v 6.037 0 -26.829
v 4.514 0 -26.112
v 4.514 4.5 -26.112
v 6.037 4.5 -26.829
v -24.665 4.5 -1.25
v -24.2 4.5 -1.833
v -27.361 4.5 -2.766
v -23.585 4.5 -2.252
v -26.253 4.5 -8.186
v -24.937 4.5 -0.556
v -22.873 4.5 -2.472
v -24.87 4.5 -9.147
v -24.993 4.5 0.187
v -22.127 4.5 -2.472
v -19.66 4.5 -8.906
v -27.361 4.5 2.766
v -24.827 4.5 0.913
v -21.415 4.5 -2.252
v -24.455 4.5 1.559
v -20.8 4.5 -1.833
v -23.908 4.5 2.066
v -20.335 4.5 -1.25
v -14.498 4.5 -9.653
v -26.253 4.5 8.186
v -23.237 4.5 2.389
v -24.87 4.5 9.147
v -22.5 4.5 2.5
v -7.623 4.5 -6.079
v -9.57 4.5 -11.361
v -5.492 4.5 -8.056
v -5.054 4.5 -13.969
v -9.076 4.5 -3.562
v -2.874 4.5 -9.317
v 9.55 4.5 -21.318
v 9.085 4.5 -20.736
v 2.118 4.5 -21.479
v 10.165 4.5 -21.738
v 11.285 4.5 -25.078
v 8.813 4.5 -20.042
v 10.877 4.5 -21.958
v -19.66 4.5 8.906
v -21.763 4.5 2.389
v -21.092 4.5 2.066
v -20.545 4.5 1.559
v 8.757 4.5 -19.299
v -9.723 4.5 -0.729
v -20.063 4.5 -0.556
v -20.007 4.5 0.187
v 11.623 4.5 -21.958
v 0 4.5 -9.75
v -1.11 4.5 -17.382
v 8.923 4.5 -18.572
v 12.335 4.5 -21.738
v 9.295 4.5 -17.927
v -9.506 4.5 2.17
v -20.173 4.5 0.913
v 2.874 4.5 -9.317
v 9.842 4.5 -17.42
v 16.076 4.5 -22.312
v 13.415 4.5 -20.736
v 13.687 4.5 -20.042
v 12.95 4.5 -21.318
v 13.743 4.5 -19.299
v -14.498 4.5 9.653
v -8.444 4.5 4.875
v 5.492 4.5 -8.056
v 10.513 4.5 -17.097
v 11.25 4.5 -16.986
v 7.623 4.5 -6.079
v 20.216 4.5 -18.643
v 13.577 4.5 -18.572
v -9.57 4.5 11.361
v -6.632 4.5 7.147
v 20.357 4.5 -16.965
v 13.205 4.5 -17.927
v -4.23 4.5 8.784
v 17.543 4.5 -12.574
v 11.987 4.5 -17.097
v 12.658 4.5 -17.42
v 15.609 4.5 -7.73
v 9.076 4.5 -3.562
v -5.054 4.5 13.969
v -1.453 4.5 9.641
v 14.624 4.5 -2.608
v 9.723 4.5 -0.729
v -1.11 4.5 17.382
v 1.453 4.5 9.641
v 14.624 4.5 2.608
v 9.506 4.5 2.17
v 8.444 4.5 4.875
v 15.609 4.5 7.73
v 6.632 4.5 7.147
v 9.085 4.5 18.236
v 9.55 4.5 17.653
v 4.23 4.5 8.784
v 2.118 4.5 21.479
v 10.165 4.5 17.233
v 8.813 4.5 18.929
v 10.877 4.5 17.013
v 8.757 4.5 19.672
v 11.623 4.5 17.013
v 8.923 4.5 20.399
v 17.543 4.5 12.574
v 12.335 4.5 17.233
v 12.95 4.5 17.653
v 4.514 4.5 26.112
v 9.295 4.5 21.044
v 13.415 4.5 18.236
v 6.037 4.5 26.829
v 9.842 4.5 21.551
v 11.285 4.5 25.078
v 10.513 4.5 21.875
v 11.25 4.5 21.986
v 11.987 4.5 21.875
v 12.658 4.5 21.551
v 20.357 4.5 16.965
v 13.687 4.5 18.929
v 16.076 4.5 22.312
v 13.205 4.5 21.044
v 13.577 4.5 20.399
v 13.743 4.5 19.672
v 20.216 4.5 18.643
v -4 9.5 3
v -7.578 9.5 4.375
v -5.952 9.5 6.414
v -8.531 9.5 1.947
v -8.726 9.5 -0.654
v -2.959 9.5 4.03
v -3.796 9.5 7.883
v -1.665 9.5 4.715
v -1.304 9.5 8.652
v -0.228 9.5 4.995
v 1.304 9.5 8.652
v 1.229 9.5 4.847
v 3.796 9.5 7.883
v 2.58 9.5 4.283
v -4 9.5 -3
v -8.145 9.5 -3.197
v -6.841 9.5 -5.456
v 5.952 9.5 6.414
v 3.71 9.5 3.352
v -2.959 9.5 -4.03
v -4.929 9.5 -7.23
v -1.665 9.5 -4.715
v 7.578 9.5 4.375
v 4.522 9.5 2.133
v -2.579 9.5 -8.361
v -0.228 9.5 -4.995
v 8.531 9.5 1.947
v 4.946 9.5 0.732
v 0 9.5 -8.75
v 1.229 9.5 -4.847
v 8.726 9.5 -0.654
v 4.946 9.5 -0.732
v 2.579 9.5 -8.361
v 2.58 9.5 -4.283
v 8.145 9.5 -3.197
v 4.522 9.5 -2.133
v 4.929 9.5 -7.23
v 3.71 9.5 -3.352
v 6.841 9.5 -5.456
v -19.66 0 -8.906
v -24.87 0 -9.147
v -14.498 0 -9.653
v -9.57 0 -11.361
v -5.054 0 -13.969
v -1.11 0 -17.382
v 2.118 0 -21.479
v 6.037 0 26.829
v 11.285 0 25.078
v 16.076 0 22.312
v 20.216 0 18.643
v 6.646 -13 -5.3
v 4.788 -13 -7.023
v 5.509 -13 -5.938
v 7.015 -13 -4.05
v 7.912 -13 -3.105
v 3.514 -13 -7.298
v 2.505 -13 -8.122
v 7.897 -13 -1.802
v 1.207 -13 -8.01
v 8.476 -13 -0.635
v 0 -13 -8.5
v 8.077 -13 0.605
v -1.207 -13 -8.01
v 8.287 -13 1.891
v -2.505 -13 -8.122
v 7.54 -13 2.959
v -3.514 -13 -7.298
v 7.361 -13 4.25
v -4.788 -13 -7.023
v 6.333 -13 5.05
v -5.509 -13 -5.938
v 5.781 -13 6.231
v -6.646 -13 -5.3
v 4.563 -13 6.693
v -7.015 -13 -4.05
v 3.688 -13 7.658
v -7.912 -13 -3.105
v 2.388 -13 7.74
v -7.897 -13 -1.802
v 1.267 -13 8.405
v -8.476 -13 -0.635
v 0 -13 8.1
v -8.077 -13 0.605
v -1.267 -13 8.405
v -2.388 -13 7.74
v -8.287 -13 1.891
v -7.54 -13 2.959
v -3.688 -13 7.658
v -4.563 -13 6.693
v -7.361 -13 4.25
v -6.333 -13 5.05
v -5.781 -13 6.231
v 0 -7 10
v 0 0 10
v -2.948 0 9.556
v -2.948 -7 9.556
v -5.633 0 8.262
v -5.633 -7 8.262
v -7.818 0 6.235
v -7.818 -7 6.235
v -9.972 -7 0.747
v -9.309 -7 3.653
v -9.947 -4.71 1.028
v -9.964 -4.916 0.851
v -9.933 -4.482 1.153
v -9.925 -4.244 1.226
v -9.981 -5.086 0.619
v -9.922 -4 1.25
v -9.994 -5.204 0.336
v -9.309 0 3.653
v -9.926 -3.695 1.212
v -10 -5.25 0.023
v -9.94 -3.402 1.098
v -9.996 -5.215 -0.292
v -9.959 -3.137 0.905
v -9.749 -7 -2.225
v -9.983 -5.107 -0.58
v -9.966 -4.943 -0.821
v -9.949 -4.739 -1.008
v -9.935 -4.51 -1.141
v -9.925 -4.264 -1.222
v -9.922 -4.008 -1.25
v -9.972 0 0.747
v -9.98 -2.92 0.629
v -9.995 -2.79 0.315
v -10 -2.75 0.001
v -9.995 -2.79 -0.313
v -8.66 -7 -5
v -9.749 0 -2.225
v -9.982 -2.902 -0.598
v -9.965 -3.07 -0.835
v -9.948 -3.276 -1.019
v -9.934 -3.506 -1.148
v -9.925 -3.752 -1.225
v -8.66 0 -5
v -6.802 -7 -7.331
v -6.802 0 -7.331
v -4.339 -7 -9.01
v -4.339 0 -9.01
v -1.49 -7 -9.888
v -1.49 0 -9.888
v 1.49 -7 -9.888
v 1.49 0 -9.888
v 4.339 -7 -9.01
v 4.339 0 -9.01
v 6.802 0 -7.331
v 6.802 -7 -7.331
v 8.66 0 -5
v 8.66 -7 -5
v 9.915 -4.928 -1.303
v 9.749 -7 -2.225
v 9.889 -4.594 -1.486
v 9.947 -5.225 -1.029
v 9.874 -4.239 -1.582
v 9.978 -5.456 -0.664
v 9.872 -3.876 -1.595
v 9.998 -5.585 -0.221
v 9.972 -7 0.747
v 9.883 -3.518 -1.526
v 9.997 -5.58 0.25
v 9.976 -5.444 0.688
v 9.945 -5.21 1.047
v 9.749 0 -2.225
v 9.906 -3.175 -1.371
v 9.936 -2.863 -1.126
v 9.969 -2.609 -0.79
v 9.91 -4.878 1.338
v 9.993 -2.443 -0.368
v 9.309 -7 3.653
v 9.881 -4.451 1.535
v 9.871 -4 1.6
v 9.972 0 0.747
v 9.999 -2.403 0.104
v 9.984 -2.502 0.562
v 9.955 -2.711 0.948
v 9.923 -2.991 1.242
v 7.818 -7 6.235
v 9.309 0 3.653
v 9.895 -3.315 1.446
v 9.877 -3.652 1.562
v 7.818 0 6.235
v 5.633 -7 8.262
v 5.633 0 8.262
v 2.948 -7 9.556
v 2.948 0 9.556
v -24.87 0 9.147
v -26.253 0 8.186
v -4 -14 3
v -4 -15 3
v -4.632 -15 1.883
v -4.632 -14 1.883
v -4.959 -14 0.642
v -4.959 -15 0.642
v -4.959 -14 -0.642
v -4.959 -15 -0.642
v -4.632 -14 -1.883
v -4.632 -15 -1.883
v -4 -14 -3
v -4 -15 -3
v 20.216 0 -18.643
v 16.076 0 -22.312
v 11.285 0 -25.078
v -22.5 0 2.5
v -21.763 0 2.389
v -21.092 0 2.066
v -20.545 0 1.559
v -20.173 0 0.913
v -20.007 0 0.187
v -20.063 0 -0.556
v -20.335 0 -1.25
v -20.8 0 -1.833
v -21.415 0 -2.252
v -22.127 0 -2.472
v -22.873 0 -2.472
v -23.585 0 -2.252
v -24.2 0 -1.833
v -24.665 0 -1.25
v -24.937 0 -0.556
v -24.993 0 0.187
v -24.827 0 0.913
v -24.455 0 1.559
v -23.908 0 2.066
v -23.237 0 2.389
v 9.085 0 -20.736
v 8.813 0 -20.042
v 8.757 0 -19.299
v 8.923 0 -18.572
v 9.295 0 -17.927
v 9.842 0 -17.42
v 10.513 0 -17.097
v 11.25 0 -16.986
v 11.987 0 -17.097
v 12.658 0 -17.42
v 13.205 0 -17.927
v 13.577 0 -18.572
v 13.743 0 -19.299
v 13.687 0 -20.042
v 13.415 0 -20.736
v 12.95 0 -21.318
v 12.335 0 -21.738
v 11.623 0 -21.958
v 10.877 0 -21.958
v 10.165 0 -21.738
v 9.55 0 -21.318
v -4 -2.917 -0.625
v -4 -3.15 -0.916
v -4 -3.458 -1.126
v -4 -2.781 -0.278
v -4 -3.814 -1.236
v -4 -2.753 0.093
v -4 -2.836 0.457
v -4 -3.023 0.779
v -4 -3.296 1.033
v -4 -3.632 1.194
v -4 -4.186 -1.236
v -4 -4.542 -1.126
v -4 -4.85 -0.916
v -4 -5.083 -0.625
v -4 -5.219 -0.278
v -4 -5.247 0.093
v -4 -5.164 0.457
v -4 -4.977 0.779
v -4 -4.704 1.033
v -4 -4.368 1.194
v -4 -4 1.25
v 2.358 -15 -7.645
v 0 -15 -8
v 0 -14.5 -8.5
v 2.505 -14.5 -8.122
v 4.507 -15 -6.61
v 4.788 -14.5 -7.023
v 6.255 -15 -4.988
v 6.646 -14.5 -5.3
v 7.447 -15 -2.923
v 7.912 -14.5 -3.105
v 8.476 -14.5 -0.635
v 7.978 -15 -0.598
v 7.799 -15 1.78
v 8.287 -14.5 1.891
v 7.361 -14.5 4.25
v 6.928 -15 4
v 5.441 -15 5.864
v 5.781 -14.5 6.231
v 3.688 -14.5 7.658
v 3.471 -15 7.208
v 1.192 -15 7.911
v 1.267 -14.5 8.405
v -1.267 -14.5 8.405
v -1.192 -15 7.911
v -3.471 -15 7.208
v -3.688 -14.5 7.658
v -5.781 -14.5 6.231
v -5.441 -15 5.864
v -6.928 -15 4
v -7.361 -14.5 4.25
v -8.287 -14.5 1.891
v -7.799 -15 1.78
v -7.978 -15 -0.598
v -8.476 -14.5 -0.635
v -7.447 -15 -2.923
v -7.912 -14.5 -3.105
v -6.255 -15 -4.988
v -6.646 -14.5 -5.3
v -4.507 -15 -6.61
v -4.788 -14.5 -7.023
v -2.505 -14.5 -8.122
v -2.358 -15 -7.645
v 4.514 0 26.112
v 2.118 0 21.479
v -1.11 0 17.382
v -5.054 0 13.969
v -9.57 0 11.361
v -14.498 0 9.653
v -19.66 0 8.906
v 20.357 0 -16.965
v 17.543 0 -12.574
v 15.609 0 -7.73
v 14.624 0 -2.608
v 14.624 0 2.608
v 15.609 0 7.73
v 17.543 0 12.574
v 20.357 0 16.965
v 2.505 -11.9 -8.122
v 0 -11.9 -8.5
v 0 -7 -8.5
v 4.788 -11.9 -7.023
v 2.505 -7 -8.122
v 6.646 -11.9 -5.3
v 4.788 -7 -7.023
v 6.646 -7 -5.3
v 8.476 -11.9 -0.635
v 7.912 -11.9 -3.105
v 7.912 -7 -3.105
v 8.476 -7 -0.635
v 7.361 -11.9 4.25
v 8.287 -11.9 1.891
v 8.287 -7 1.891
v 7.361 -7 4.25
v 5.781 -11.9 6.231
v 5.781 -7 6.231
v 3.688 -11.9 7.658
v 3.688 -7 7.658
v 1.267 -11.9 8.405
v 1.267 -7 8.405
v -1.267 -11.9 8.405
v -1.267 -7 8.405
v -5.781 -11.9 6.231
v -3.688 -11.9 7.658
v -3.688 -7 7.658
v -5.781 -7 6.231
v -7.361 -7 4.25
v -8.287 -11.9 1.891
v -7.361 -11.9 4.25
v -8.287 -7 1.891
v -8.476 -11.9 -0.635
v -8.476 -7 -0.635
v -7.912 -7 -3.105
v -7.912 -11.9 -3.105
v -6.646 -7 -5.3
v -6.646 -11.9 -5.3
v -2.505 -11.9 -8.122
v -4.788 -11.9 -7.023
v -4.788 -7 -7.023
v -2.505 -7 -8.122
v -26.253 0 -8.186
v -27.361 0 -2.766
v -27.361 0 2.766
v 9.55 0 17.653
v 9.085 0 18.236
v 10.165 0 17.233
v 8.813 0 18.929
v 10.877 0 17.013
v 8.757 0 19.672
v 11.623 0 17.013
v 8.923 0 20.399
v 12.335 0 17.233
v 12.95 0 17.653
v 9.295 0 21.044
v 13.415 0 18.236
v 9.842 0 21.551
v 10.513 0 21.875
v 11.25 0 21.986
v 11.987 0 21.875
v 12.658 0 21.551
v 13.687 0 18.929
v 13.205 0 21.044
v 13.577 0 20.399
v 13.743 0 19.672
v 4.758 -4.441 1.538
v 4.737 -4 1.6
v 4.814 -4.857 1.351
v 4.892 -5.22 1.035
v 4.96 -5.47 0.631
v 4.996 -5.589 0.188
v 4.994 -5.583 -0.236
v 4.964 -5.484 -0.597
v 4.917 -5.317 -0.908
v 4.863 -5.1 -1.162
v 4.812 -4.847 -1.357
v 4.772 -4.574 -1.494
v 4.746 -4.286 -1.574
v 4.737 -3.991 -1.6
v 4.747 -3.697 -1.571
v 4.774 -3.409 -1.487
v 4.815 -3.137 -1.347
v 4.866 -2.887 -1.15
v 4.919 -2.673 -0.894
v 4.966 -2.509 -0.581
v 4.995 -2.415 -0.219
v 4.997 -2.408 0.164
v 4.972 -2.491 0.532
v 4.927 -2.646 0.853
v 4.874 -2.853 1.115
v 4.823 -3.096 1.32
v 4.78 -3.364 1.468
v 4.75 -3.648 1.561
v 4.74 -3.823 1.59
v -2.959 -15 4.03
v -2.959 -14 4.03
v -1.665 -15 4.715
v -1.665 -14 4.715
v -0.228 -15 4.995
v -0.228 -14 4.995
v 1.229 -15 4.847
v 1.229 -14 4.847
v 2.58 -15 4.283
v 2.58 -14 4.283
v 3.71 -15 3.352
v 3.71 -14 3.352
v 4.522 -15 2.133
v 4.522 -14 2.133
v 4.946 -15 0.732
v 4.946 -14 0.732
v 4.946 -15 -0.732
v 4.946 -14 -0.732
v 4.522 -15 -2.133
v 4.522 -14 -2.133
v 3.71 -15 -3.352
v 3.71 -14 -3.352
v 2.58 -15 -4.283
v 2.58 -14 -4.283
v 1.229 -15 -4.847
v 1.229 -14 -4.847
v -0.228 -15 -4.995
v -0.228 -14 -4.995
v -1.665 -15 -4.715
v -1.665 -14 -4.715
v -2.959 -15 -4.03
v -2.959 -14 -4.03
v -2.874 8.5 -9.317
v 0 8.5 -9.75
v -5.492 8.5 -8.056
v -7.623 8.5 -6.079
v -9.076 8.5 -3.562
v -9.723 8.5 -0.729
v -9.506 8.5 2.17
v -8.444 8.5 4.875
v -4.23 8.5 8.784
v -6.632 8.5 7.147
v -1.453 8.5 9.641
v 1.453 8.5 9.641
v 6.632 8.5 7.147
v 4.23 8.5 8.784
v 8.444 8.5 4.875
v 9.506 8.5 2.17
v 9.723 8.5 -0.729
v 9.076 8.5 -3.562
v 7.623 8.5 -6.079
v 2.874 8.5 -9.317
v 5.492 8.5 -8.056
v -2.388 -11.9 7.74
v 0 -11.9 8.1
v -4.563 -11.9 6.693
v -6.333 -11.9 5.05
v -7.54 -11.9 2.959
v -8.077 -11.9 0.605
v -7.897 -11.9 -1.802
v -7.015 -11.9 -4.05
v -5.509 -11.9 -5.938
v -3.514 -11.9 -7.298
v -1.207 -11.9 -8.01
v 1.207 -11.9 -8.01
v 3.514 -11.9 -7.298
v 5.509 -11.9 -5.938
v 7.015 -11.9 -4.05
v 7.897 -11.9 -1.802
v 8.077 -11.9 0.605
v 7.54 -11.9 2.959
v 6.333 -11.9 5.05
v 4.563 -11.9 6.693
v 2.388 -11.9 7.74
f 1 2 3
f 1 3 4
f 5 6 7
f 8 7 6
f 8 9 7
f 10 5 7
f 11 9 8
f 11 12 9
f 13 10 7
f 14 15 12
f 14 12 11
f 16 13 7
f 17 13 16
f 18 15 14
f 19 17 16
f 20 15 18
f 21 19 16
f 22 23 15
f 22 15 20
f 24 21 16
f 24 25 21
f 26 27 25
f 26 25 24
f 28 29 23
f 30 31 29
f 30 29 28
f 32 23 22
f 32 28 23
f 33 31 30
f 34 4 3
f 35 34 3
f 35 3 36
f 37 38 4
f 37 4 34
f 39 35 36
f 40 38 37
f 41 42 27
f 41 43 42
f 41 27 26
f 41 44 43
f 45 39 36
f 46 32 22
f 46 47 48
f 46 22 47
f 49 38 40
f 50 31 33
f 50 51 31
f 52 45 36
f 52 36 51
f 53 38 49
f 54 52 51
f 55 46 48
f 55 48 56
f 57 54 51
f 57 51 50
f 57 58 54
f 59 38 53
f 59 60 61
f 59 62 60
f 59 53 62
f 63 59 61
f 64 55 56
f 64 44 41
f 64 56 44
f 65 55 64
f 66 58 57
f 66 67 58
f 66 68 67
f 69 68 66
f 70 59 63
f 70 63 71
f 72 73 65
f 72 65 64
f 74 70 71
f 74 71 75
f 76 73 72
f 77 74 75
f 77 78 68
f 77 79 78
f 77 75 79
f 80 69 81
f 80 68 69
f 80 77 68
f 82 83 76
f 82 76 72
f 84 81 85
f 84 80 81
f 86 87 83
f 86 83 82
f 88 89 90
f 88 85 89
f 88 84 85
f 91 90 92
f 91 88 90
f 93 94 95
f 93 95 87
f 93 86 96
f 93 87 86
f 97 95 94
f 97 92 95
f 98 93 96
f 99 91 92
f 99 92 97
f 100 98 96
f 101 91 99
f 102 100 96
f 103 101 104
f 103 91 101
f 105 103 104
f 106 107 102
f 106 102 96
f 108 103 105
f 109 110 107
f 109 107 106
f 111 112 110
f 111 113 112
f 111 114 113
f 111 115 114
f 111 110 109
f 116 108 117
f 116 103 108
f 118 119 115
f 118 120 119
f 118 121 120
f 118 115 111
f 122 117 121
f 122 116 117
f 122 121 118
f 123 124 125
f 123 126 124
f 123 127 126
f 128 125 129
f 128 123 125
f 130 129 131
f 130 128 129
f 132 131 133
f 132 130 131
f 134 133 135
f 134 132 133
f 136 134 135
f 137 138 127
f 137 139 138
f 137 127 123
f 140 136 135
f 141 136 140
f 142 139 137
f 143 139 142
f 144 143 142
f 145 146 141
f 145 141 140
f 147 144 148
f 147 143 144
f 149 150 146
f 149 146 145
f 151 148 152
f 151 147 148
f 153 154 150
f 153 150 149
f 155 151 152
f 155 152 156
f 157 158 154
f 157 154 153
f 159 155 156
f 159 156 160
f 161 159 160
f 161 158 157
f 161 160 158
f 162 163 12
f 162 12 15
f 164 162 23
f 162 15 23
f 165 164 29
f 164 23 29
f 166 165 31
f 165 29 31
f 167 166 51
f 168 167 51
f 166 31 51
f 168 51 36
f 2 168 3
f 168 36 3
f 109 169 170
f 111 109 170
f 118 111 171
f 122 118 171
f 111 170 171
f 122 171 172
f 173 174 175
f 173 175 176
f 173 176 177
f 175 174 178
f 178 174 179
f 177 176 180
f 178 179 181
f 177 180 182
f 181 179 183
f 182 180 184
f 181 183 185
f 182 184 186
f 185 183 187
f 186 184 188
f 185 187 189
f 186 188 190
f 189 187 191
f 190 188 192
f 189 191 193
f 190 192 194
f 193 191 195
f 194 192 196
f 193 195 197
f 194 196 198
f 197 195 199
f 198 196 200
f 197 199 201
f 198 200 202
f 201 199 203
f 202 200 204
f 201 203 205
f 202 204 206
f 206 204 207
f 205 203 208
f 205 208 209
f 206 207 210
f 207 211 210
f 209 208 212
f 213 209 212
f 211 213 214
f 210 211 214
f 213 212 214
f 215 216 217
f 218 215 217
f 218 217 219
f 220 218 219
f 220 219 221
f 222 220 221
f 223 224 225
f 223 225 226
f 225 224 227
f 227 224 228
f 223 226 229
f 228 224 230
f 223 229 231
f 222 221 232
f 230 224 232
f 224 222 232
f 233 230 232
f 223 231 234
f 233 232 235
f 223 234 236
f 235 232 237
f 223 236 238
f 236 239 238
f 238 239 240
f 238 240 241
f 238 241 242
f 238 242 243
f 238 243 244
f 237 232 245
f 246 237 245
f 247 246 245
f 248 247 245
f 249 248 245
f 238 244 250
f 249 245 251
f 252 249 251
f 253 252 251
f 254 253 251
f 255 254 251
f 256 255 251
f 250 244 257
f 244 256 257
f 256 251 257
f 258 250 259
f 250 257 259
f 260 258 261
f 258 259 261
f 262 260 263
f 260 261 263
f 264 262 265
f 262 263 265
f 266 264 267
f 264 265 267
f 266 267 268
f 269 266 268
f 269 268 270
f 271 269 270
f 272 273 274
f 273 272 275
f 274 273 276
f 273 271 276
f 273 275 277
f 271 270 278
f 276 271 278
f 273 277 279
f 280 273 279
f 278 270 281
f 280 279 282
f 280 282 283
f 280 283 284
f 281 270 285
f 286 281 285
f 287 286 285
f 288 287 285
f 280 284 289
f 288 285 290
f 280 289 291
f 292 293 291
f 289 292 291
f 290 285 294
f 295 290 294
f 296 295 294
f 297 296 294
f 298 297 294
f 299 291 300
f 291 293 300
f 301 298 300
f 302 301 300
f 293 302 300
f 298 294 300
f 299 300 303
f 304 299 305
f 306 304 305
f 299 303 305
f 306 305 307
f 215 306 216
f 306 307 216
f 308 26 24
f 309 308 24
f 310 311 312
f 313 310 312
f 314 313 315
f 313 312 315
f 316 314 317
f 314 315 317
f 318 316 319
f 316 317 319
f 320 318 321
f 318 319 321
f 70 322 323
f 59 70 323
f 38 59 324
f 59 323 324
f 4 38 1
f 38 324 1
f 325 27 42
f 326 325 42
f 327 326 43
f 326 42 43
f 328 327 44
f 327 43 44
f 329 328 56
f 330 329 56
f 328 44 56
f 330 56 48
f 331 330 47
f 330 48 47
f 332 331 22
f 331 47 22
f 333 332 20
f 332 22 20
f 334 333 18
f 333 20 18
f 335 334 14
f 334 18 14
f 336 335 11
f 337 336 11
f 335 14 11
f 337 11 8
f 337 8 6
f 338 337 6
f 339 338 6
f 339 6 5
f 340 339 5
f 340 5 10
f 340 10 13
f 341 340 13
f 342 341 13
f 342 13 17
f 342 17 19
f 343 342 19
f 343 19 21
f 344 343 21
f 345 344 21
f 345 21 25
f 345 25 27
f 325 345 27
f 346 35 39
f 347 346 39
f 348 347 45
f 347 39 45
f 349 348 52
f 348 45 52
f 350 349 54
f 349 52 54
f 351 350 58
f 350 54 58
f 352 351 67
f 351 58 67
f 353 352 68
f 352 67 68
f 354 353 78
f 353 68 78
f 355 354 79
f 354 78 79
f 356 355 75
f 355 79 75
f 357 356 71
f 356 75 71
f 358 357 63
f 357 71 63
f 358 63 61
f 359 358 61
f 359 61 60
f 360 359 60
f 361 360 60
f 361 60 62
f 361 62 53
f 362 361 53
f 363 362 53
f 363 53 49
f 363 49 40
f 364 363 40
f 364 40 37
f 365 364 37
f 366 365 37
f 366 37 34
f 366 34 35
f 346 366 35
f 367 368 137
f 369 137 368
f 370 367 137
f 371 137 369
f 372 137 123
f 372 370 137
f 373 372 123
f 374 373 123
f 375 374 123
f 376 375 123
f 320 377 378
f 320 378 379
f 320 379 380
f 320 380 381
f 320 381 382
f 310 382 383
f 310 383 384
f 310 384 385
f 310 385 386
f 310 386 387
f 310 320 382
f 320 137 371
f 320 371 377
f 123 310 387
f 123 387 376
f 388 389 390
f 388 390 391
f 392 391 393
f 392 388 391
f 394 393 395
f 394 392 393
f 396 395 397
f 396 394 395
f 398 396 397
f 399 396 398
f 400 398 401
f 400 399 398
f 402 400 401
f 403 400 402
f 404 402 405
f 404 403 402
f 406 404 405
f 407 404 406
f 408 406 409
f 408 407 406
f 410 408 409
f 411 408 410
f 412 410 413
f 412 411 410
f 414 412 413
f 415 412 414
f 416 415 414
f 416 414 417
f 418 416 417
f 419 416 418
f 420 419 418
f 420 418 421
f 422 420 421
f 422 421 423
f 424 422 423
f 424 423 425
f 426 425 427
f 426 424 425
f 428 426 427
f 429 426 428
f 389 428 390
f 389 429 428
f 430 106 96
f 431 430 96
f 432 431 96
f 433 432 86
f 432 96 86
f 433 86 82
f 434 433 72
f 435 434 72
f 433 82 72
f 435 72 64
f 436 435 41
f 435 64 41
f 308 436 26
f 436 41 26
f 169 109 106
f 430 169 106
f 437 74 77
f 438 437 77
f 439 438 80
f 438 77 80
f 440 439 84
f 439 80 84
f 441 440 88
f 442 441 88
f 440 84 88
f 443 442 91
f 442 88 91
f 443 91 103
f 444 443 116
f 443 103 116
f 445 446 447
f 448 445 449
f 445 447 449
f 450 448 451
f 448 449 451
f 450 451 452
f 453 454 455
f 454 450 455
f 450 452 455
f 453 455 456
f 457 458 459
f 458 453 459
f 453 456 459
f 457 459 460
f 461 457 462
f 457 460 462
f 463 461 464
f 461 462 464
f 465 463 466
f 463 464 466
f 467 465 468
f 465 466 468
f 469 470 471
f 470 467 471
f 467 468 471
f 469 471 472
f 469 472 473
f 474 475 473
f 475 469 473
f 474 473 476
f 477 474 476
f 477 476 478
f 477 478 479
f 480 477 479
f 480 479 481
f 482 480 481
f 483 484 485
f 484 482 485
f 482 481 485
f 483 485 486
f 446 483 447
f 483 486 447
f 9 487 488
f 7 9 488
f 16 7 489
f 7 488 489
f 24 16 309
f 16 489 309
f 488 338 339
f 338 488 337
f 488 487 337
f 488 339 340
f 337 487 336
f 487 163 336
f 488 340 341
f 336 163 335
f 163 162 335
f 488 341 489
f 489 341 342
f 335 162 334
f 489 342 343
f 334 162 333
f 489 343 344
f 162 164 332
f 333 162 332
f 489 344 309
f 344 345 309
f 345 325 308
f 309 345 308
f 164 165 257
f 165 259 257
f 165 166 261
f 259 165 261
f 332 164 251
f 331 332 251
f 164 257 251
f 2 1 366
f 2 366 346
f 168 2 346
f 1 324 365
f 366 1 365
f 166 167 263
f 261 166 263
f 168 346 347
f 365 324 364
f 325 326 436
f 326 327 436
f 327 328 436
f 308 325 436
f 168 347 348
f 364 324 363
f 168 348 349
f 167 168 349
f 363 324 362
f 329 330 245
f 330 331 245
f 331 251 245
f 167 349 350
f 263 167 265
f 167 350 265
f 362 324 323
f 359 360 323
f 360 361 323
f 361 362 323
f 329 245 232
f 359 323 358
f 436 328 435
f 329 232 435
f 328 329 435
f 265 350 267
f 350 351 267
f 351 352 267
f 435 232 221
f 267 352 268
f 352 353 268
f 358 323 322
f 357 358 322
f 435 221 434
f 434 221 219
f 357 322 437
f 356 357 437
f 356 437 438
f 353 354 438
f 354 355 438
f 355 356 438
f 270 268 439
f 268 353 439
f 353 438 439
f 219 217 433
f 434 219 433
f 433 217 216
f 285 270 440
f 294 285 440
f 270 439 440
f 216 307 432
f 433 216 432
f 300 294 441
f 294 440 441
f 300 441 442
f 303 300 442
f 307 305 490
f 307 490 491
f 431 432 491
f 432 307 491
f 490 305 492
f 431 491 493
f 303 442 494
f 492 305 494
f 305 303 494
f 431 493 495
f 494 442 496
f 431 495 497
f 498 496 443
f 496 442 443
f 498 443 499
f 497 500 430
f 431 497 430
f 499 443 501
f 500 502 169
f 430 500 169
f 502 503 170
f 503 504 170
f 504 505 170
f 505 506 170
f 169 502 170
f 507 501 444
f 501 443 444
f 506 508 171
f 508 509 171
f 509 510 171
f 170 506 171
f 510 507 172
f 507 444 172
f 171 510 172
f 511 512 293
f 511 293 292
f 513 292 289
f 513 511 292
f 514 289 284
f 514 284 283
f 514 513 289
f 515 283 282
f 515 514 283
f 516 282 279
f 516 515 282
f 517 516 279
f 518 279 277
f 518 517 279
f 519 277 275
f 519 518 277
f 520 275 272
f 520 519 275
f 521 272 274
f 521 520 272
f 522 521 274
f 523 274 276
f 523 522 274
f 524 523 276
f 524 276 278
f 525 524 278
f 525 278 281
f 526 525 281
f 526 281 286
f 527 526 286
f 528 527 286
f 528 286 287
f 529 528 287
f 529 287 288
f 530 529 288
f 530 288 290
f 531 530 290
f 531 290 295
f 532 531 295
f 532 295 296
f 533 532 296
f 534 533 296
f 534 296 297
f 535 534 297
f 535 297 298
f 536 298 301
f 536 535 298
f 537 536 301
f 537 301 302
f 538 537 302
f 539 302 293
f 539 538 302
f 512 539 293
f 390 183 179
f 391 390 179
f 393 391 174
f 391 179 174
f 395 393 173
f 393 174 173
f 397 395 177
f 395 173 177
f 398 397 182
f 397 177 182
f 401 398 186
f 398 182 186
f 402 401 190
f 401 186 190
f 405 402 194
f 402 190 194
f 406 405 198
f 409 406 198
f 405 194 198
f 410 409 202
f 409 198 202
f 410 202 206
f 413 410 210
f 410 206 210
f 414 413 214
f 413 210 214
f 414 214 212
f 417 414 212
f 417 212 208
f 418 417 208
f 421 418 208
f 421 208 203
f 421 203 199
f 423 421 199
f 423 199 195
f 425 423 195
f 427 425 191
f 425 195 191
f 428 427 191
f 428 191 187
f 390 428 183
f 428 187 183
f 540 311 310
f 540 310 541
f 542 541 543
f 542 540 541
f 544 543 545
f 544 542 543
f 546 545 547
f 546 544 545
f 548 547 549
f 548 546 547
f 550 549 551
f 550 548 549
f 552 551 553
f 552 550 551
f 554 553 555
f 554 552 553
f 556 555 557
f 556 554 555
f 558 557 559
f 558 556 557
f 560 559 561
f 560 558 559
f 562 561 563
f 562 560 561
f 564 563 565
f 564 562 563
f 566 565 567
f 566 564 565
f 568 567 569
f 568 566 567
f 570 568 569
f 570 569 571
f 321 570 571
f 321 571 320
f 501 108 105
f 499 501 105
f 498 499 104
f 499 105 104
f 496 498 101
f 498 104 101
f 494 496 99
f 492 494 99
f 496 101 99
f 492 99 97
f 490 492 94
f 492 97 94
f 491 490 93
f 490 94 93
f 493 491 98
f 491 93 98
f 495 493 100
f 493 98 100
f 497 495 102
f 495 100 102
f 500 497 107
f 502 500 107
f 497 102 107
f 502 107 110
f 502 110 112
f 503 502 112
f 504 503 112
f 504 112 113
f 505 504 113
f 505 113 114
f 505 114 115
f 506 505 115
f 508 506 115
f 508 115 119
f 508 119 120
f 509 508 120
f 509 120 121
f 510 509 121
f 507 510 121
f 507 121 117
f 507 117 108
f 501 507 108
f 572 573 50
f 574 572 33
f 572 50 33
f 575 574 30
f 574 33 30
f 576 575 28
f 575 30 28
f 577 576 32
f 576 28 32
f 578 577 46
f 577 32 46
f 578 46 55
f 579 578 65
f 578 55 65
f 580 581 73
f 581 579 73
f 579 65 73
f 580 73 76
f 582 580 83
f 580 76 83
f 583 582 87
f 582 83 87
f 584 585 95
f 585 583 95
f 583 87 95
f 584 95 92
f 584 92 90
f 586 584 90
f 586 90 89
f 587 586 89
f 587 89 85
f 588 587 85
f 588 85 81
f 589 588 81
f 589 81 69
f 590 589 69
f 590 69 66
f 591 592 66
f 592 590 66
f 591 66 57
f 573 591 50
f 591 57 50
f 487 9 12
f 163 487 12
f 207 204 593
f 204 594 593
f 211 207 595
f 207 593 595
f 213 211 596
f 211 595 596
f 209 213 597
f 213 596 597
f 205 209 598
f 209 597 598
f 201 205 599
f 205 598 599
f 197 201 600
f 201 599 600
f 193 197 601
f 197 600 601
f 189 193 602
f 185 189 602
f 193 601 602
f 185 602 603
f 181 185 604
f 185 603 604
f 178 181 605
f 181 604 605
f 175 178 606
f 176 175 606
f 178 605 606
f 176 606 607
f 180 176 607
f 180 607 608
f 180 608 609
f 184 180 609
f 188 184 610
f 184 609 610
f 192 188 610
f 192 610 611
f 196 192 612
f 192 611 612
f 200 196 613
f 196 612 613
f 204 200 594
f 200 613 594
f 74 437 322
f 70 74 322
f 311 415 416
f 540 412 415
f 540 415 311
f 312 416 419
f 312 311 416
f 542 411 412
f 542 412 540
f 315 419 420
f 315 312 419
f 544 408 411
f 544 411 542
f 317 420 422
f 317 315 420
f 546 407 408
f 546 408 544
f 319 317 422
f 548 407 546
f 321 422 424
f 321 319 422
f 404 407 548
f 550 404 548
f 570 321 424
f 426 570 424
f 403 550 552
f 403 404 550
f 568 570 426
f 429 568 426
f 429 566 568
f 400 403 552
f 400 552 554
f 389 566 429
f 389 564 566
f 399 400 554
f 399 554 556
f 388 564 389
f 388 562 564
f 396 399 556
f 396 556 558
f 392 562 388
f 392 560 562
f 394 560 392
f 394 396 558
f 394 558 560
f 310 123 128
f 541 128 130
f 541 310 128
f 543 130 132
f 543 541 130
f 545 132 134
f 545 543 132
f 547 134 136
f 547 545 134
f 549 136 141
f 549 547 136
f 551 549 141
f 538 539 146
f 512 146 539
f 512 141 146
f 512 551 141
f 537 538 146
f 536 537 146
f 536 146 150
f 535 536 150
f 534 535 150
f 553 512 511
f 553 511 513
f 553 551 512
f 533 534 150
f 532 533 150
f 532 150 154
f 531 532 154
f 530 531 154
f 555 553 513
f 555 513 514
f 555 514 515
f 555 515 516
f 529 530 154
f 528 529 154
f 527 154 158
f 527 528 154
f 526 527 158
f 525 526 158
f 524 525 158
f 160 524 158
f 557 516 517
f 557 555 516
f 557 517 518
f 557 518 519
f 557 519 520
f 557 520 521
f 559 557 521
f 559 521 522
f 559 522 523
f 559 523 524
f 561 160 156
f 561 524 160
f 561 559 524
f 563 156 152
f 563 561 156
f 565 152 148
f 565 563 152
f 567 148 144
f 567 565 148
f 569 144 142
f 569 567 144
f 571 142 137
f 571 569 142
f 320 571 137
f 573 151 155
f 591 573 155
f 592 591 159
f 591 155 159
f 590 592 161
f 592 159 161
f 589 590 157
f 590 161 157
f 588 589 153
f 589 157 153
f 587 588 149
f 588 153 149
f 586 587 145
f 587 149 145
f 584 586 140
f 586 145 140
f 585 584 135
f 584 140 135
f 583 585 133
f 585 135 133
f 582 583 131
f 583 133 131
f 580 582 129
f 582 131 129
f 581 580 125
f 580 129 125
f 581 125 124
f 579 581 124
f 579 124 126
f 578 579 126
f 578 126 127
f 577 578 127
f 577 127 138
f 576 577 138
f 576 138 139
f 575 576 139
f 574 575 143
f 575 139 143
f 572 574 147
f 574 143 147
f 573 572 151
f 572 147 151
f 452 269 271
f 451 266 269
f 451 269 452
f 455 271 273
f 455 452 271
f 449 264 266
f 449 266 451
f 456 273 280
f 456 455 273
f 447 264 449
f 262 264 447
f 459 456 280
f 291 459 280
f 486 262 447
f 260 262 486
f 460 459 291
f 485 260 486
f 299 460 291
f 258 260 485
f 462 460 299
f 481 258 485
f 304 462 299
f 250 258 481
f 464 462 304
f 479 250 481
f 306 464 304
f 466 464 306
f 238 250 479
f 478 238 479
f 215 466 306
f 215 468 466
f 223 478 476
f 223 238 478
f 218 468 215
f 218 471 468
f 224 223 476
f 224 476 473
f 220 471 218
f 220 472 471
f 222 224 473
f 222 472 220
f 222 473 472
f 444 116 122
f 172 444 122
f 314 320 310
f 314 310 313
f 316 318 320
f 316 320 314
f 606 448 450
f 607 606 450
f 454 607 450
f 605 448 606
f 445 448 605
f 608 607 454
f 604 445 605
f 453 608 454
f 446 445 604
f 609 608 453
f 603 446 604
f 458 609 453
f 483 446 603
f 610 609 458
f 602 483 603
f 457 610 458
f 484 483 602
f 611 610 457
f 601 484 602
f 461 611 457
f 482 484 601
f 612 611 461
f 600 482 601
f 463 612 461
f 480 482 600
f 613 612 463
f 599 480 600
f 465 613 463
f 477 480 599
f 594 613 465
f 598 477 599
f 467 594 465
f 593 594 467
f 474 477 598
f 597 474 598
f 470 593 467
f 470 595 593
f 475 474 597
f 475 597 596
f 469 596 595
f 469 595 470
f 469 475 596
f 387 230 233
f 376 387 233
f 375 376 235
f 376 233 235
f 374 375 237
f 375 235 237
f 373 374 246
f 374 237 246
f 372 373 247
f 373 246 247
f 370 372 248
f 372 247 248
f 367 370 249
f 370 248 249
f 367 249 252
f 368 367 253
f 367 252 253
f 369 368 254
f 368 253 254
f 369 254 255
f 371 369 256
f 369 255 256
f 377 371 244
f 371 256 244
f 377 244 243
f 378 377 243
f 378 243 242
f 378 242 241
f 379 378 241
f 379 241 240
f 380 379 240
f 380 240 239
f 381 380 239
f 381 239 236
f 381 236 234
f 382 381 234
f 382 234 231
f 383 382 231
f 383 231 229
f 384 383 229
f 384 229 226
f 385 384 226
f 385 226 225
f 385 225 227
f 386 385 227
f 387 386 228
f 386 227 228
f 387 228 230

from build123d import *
from build123d.topology import SkipClean

# Parameters (mm, degrees)
SKETCH_1_R               = 27.5
EXTRUDE_1_DEPTH          = 4.5
SKETCH_2_R               = 9.75
EXTRUDE_2_DEPTH          = 30.8
CUT_EXTRUDE_1_DEPTH      = 28
SKETCH_5_R               = 10
EXTRUDE_3_DEPTH          = 7
SKETCH_6_R               = 8.5
EXTRUDE_4_DEPTH          = 8
SKETCH_11_R              = 2.5
CUT_EXTRUDE_3_DEPTH      = 50.609878049
PATTERN_CIRCULAR_1_COUNT = 6
SKETCH_12_R              = 13.008113322
CUT_EXTRUDE_4_DEPTH      = 25.8
CHAMFER_2_SIZE           = 1
SKETCH_13_W              = 0.4
SKETCH_13_H              = 1.1
CHAMFER_3_SIZE           = 0.5
CUT_EXTRUDE_5_DEPTH      = 46.964660338
SKETCH_15_R              = 1.6
CUT_EXTRUDE_6_DEPTH      = 25
HOLE_WIZARD_M3_1_D       = 2.5
SKETCH_18_R              = 27.5
CUT_EXTRUDE_7_DEPTH      = 44.505746792
PATTERN_CIRCULAR_2_COUNT = 3
PATTERN_CIRCULAR_2_ANGLE = 240
SKETCH_19_R              = 5
CUT_EXTRUDE_8_DEPTH      = 1


with BuildPart() as part:
    # 草图1 → 凸台-拉伸1 (new body)
    with BuildSketch(Plane(origin=(0, 0, 0), x_dir=(1, 0, 0), z_dir=(0, 1, 0))):
        with Locations(Location((0, 0, 0), (0, 0, 270))):
            Circle(SKETCH_1_R)
    extrude(amount=EXTRUDE_1_DEPTH)

    # 草图2 → 凸台-拉伸2 (add)
    with BuildSketch(Plane(origin=(0, 4.5, 0), x_dir=(1, 0, 0), z_dir=(0, 1, 0))):
        with Locations(Location((0, 0, 0), (0, 0, 90))):
            Circle(SKETCH_2_R)
    extrude(amount=EXTRUDE_2_DEPTH)

    # 草图4 → 切除-拉伸1 (cut)
    with BuildSketch(Plane(origin=(0, 35.3, 0), x_dir=(1, 0, 0), z_dir=(0, 1, 0))):
        with BuildLine():
            Line((-4, 3), (-4, -3))
            ThreePointArc((-4, -3), (5, 0), (-4, 3))
        make_face()
    extrude(amount=-CUT_EXTRUDE_1_DEPTH, mode=Mode.SUBTRACT)

    # 草图5 → 凸台-拉伸3 (add)
    with BuildSketch(Plane.XZ):
        with Locations(Location((0, 0, 0), (0, 0, 90))):
            Circle(SKETCH_5_R)
    extrude(amount=EXTRUDE_3_DEPTH)

    # 草图6 → 凸台-拉伸4 (add)
    with BuildSketch(Plane.XZ.offset(7)):
        with Locations(Location((0, 0, 0), (0, 0, 270))):
            Circle(SKETCH_6_R)
    extrude(amount=EXTRUDE_4_DEPTH)

    # 草图11 → 切除-拉伸3 (cut, through all)
    with BuildSketch(Plane(origin=(0, 4.5, 0), x_dir=(1, 0, 0), z_dir=(0, 1, 0))):
        with Locations(Location((-22.5, 0, 0), (0, 0, 270))):
            Circle(SKETCH_11_R)
    cut_extrude_3 = extrude(amount=-CUT_EXTRUDE_3_DEPTH, mode=Mode.SUBTRACT)

    # 阵列(圆周)1: 切除-拉伸3 ×6 about axis
    pattern_circular_1_axis = Axis((0, 0, 0), (0, 1, 0))
    for i in range(1, PATTERN_CIRCULAR_1_COUNT):
        add(cut_extrude_3.rotate(pattern_circular_1_axis, i * 360 / PATTERN_CIRCULAR_1_COUNT), mode=Mode.SUBTRACT)

    # 草图12 → 切除-拉伸4 (cut)
    with BuildSketch(Plane(origin=(0, 35.3, 0), x_dir=(1, 0, 0), z_dir=(0, 1, 0))):
        Circle(SKETCH_12_R)
    extrude(amount=-CUT_EXTRUDE_4_DEPTH, mode=Mode.SUBTRACT)

    # 倒角2
    chamfer_2_edges = [part.edges().sort_by_distance(p)[0] for p in [
        (0, 9.5, 9.75),
    ]]
    chamfer(chamfer_2_edges, length=CHAMFER_2_SIZE)

    # 草图13 → 切除-旋转1 (revolve, cut)
    with BuildSketch(Plane.XY, mode=Mode.PRIVATE) as cut_revolve_1_sk:
        with Locations((-8.3, -12.45)):
            Rectangle(SKETCH_13_W, SKETCH_13_H)
    revolve(cut_revolve_1_sk.sketch.rotate(Axis((0, 20.99290486, 0), (0, -1, 0)), 270), axis=Axis((0, 20.99290486, 0), (0, -1, 0)), mode=Mode.SUBTRACT)

    # 倒角3
    chamfer_3_edges = [part.edges().sort_by_distance(p)[0] for p in [
        (0, -15, 8.5),
    ]]
    chamfer(chamfer_3_edges, length=CHAMFER_3_SIZE)

    # 草图14 → 切除-拉伸5 (cut, through all)
    with BuildSketch(Plane.XZ.offset(15)):
        with BuildLine():
            Line((-4, -3), (-4, 3))
            ThreePointArc((-4, 3), (5, 0), (-4, -3))
        make_face()
    extrude(amount=-CUT_EXTRUDE_5_DEPTH, mode=Mode.SUBTRACT)

    # 草图15 → 切除-拉伸6 (cut)
    with BuildSketch(Plane(origin=(0, 0, 0), x_dir=(0, 0, -1), z_dir=(1, 0, 0))):
        with Locations(Location((0, -4, 0), (0, 0, 180))):
            Circle(SKETCH_15_R)
    extrude(amount=CUT_EXTRUDE_6_DEPTH, mode=Mode.SUBTRACT)

    # M3 螺纹孔1 (through all)
    with Locations(Plane(origin=(-4, 0, 0), x_dir=(0, 0, -1), z_dir=(1, 0, 0))):
        with Locations((0, -4)):
            Hole(HOLE_WIZARD_M3_1_D / 2)

    # 草图18 → 切除-拉伸7 (cut, through all)
    with BuildSketch(Plane(origin=(0, 4.5, 0), x_dir=(1, 0, 0), z_dir=(0, 1, 0))):
        with Locations((42, 0)):
            Circle(SKETCH_18_R)
    cut_extrude_7 = extrude(amount=-CUT_EXTRUDE_7_DEPTH, mode=Mode.SUBTRACT)

    # 阵列(圆周)2: 切除-拉伸7 ×3 about axis
    pattern_circular_2_axis = Axis((0, 0, 0), (0, 1, 0))
    for i in range(1, PATTERN_CIRCULAR_2_COUNT):
        add(cut_extrude_7.rotate(pattern_circular_2_axis, i * PATTERN_CIRCULAR_2_ANGLE / (PATTERN_CIRCULAR_2_COUNT - 1)), mode=Mode.SUBTRACT)

    # 倒角4
    # the kernel refuses this chamfer: 1.21981355, 1 mm, written as the material it takes off along each edge
    with BuildSketch(Plane(origin=(21, 7.559330204, 17.755280905), x_dir=(-0.6313868632849613, 0, -0.7754680063491838), z_dir=(0, -1, 0)), Plane(origin=(4.876524315, 7.559330204, -27.064173932), x_dir=(-0.3558815616779696, 0, 0.9345310663951465), z_dir=(0, -1, 0)), Plane(origin=(-25.876524315, 7.559330204, 9.308893027), x_dir=(0.9872684249629431, 0, -0.15906306004597578), z_dir=(0, -1, 0))) as chamfer_4_piece_1:
        with BuildLine():
            Line((1.019056312, 0), (-0.193408604, -1.168344991))
            ThreePointArc((-0.193408604, -1.168344991), (-0.106182465, -0.602433867), (0, 0))
            ThreePointArc((0, 0), (0.527109428, -0.00471513), (1.019056312, 0))
        make_face()
    extrude(amount=10.618660408, mode=Mode.SUBTRACT)
    with BuildSketch(Plane(origin=(21, 7.559330204, -17.755280905), x_dir=(-0.6313868632849639, 0, 0.7754680063491817), z_dir=(0, -1, 0))) as chamfer_4_piece_2:
        with BuildLine():
            Line((1.019056312, 0), (-0.193408604, 1.168344991))
            ThreePointArc((-0.193408604, 1.168344991), (-0.106182465, 0.602433867), (0, 0))
            ThreePointArc((0, 0), (0.527109428, 0.00471513), (1.019056312, 0))
        make_face()
    extrude(amount=10.618660408, mode=Mode.SUBTRACT)
    with BuildSketch(Plane(origin=(-25.876524315, 7.559330204, -9.308893027), x_dir=(-0.31816612737533284, 0, 0.9480349758268328), z_dir=(0, -1, 0)), Plane(origin=(4.876524315, 7.559330204, 27.064173932), x_dir=(0.9801054364298685, 0, -0.1984775389826691), z_dir=(0, -1, 0))) as chamfer_4_piece_3:
        with BuildLine():
            Line((1.18424529, 0), (-0.166430267, -1.005373928))
            ThreePointArc((-0.166430267, -1.005373928), (-0.08143465, -0.520802246), (0, 0))
            ThreePointArc((0, 0), (0.611686784, 0.006368493), (1.18424529, 0))
        make_face()
    extrude(amount=10.618660408, mode=Mode.SUBTRACT)

    # 草图19 → 切除-拉伸8 (cut)
    with SkipClean():  # the faces are left unmerged after this step: merging them gives an invalid solid
        with BuildSketch(Plane.XZ.offset(15)):
            with Locations(Location((0, 0, 0), (0, 0, 143.130102354))):
                Circle(SKETCH_19_R)
        extrude(amount=-CUT_EXTRUDE_8_DEPTH, mode=Mode.SUBTRACT)


solid = part.part
